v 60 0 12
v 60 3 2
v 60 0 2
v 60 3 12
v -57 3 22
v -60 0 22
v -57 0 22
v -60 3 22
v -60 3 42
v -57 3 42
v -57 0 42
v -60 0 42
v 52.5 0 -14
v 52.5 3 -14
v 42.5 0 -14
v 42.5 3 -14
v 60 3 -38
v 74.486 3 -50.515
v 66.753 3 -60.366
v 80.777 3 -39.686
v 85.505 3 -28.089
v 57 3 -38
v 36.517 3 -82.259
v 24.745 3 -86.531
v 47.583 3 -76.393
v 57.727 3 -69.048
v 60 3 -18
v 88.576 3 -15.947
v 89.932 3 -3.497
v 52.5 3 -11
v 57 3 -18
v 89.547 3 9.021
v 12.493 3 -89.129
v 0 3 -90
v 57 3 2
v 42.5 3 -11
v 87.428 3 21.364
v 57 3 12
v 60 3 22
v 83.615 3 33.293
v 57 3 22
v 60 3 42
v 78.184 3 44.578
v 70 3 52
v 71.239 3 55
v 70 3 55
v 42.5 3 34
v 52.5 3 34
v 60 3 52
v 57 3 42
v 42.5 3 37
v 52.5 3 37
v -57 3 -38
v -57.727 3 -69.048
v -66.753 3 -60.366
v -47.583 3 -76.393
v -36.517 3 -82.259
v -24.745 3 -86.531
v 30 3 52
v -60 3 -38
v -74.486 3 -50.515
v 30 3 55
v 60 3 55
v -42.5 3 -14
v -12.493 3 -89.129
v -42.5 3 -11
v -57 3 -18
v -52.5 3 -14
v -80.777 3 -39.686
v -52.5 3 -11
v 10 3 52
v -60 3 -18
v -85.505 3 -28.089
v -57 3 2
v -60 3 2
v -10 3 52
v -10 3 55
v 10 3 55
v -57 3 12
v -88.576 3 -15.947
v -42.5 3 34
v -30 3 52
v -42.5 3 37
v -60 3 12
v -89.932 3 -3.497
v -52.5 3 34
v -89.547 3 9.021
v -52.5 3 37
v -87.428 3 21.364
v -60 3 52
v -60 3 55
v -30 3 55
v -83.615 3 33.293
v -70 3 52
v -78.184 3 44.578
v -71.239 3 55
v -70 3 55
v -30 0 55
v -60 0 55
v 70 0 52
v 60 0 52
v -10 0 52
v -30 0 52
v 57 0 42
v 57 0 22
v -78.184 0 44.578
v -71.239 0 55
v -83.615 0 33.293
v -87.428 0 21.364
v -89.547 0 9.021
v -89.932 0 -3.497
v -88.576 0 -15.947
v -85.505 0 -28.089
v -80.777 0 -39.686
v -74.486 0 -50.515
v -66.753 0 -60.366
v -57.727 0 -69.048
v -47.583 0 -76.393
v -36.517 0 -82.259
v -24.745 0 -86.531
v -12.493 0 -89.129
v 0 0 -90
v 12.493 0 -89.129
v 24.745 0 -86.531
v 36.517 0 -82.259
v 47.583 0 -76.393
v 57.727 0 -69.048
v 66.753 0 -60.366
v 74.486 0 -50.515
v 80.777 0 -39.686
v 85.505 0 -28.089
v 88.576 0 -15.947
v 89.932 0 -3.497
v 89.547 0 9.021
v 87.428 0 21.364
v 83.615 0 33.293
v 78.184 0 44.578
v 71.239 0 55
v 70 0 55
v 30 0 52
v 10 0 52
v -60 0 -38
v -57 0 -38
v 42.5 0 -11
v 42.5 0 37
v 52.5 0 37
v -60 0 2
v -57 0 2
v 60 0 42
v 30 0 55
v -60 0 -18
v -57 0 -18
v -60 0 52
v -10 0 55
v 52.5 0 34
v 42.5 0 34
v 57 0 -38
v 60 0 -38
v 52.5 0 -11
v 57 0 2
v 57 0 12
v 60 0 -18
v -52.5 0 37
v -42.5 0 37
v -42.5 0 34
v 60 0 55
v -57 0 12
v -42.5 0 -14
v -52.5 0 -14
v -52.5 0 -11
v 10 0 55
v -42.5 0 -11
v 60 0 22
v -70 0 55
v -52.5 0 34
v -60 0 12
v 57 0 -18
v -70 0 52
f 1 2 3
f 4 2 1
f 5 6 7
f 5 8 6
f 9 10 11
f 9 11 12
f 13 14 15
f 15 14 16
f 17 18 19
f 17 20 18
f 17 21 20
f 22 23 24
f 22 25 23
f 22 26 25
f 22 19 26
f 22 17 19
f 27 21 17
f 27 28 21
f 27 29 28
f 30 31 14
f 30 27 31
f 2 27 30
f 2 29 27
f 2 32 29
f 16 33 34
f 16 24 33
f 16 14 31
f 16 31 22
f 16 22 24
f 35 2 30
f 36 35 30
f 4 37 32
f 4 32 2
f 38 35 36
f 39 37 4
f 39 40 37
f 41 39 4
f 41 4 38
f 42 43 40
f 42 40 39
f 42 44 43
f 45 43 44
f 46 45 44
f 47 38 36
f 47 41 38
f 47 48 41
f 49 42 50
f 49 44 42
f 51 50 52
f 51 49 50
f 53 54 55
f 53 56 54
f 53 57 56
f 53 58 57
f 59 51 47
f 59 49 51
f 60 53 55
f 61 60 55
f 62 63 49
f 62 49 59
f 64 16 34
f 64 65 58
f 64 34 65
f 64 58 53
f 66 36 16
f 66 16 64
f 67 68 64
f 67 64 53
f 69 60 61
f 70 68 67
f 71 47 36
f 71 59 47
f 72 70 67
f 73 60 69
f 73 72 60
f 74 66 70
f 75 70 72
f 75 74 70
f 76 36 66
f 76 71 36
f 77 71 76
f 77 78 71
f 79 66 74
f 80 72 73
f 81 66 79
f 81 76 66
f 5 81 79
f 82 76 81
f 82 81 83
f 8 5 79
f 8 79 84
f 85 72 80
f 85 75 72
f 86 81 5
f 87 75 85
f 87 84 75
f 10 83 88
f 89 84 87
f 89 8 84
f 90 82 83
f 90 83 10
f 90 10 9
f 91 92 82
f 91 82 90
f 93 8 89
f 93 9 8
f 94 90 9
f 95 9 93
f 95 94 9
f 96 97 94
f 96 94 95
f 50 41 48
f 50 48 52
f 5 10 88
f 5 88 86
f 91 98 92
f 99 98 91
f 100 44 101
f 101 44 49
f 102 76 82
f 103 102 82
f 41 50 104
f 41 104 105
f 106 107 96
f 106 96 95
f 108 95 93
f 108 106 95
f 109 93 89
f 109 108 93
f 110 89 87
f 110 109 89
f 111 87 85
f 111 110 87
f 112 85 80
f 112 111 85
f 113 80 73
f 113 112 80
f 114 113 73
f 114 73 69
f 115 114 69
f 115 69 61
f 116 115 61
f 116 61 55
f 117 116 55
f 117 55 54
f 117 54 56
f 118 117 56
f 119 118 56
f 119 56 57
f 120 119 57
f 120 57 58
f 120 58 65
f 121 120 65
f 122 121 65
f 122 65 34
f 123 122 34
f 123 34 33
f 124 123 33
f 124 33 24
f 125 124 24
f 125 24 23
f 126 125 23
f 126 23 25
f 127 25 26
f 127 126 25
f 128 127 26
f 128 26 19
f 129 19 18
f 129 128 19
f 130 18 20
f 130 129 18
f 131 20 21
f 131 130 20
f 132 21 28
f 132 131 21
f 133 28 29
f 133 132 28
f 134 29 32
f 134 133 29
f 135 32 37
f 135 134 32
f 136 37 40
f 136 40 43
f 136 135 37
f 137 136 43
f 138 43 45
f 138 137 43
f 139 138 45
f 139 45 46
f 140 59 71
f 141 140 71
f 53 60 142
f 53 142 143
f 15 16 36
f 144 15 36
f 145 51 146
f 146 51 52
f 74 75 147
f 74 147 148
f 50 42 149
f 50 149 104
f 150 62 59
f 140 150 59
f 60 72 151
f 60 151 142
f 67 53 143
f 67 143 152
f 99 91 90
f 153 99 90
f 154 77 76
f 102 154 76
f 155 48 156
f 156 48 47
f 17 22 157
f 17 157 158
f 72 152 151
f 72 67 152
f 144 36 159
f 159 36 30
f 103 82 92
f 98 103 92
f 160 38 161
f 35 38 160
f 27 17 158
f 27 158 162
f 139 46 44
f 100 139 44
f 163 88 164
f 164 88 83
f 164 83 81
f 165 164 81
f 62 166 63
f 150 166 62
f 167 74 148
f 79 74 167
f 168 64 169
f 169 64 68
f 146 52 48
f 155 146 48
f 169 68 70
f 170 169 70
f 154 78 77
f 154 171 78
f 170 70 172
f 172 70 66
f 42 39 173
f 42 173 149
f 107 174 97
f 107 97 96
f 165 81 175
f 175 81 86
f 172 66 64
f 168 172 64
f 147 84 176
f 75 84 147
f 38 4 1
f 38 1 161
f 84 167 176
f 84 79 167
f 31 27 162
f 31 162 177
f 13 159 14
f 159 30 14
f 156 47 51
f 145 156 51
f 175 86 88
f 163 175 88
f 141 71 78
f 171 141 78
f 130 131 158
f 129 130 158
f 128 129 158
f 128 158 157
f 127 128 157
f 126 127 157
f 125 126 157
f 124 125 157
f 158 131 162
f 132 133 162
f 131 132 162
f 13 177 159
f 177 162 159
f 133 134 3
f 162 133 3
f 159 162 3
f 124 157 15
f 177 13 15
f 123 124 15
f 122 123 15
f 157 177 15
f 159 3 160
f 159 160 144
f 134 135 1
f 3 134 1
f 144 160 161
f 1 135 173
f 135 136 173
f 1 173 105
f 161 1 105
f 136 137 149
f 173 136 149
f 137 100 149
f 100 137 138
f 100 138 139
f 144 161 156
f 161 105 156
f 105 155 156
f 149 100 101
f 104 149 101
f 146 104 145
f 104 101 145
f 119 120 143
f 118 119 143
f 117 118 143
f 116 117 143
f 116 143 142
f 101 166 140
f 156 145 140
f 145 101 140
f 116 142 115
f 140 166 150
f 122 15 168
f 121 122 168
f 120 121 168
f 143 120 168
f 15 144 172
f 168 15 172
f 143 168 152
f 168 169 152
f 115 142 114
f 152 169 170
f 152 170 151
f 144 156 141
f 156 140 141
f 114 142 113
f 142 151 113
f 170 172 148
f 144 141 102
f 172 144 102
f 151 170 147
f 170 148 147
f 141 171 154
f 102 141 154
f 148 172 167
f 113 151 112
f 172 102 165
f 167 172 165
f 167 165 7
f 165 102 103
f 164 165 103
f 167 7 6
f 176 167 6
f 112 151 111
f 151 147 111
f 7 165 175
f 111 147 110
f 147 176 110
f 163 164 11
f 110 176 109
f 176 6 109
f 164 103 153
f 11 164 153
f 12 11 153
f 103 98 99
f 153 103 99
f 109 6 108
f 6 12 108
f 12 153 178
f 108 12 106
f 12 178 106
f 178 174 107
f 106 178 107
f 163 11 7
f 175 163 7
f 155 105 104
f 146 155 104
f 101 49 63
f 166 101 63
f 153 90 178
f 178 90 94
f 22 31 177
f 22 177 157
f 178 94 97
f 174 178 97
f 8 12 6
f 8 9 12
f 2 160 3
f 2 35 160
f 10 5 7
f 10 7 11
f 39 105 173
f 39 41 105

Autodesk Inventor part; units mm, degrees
ref_plane "YZ Plane" through (0, 0, 0) normal (1, 0, 0) x (0, 1, 0)
ref_plane "XZ Plane" through (0, 0, 0) normal (0, 1, 0) x (-1, 0, 0)
ref_plane "XY Plane" through (0, 0, 0) normal (0, 0, 1) x (1, 0, 0)
sketch "Sketch1" plane through (0, 0, 0) normal (0, 1, 0) x (-1, 0, 0)
  circle A0 centre (0, 0) radius 90
  line L0 (-71.239, 55) -> (71.239, 55)
  dimension "d0" = 180
  dimension "d1" = 55
extrude "Extrusion1" add sketch "Sketch1" along normal blind 3 contours A0 L0 picked at (-1.0947, 6.6866)
sketch "Sketch2" plane through (0, 3, 0) normal (0, 1, 0) x (1, 0, 0)
  line L0 (-71.239, -55) -> (71.239, -55) projected
  line L1 (-70, -55) -> (-60, -55)
  line L2 (-60, -55) -> (-60, -52)
  line L3 (-60, -52) -> (-70, -52)
  line L4 (-70, -52) -> (-70, -55)
  line L5 (-30, -55) -> (-10, -55)
  line L6 (-10, -55) -> (-10, -52)
  line L7 (-10, -52) -> (-30, -52)
  line L8 (-30, -52) -> (-30, -55)
  point P0 (0, 0)
  dimension "d4" = 10
  dimension "d5" = 3
  dimension "d6" = 20
  dimension "d7" = 3
  dimension "d8" = 10
  dimension "d9" = 30
extrude "Extrusion2" cut sketch "Sketch2" against normal blind 3
sketch "Sketch3" plane through (0, 3, 0) normal (0, 1, 0) x (1, 0, 0)
  line L0 (-57, -42) -> (-60, -42)
  line L1 (-60, -42) -> (-60, -22)
  line L2 (-60, -22) -> (-57, -22)
  line L3 (-57, -22) -> (-57, -42)
  line L4 (-57, -12) -> (-60, -12)
  line L5 (-60, -12) -> (-60, -2)
  line L6 (-60, -2) -> (-57, -2)
  line L7 (-57, -2) -> (-57, -12)
  line L8 (-57, 18) -> (-60, 18)
  line L9 (-60, 18) -> (-60, 38)
  line L10 (-60, 38) -> (-57, 38)
  line L11 (-57, 38) -> (-57, 18)
  line L12 (-70, -52) -> (-60, -52) projected
  point P0 (0, 0)
  dimension "d12" = 3
  dimension "d13" = 20
  dimension "d14" = 3
  dimension "d15" = 10
  dimension "d16" = 3
  dimension "d17" = 20
  dimension "d18" = 10
  dimension "d19" = 10
  dimension "d20" = 20
  dimension "d21" = 57
extrude "Extrusion3" cut sketch "Sketch3" against normal blind 3
sketch "Sketch4" plane through (0, 3, 0) normal (0, 1, 0) x (1, 0, 0)
  line L0 (-42.5, -34) -> (-52.5, -34)
  line L1 (-52.5, -34) -> (-52.5, -37)
  line L2 (-52.5, -37) -> (-42.5, -37)
  line L3 (-42.5, -37) -> (-42.5, -34)
  line L4 (-42.5, 14) -> (-52.5, 14)
  line L5 (-52.5, 14) -> (-52.5, 11)
  line L6 (-52.5, 11) -> (-42.5, 11)
  line L7 (-42.5, 11) -> (-42.5, 14)
  line L8 (-70, -52) -> (-60, -52) projected
  line L9 (-57, -22) -> (-57, -42) projected
  point P0 (0, 0)
  dimension "d24" = 10
  dimension "d25" = 3
  dimension "d26" = 10
  dimension "d27" = 3
  dimension "d28" = 15
  dimension "d29" = 45
  dimension "d30" = 4.5
extrude "Extrusion4" cut sketch "Sketch4" against normal blind 3
mirror "Mirror1" about plane through (0, 0, 0) normal (1, 0, 0) of "Extrusion4", "Extrusion3", "Extrusion2"
properties part number "Top Plate"
